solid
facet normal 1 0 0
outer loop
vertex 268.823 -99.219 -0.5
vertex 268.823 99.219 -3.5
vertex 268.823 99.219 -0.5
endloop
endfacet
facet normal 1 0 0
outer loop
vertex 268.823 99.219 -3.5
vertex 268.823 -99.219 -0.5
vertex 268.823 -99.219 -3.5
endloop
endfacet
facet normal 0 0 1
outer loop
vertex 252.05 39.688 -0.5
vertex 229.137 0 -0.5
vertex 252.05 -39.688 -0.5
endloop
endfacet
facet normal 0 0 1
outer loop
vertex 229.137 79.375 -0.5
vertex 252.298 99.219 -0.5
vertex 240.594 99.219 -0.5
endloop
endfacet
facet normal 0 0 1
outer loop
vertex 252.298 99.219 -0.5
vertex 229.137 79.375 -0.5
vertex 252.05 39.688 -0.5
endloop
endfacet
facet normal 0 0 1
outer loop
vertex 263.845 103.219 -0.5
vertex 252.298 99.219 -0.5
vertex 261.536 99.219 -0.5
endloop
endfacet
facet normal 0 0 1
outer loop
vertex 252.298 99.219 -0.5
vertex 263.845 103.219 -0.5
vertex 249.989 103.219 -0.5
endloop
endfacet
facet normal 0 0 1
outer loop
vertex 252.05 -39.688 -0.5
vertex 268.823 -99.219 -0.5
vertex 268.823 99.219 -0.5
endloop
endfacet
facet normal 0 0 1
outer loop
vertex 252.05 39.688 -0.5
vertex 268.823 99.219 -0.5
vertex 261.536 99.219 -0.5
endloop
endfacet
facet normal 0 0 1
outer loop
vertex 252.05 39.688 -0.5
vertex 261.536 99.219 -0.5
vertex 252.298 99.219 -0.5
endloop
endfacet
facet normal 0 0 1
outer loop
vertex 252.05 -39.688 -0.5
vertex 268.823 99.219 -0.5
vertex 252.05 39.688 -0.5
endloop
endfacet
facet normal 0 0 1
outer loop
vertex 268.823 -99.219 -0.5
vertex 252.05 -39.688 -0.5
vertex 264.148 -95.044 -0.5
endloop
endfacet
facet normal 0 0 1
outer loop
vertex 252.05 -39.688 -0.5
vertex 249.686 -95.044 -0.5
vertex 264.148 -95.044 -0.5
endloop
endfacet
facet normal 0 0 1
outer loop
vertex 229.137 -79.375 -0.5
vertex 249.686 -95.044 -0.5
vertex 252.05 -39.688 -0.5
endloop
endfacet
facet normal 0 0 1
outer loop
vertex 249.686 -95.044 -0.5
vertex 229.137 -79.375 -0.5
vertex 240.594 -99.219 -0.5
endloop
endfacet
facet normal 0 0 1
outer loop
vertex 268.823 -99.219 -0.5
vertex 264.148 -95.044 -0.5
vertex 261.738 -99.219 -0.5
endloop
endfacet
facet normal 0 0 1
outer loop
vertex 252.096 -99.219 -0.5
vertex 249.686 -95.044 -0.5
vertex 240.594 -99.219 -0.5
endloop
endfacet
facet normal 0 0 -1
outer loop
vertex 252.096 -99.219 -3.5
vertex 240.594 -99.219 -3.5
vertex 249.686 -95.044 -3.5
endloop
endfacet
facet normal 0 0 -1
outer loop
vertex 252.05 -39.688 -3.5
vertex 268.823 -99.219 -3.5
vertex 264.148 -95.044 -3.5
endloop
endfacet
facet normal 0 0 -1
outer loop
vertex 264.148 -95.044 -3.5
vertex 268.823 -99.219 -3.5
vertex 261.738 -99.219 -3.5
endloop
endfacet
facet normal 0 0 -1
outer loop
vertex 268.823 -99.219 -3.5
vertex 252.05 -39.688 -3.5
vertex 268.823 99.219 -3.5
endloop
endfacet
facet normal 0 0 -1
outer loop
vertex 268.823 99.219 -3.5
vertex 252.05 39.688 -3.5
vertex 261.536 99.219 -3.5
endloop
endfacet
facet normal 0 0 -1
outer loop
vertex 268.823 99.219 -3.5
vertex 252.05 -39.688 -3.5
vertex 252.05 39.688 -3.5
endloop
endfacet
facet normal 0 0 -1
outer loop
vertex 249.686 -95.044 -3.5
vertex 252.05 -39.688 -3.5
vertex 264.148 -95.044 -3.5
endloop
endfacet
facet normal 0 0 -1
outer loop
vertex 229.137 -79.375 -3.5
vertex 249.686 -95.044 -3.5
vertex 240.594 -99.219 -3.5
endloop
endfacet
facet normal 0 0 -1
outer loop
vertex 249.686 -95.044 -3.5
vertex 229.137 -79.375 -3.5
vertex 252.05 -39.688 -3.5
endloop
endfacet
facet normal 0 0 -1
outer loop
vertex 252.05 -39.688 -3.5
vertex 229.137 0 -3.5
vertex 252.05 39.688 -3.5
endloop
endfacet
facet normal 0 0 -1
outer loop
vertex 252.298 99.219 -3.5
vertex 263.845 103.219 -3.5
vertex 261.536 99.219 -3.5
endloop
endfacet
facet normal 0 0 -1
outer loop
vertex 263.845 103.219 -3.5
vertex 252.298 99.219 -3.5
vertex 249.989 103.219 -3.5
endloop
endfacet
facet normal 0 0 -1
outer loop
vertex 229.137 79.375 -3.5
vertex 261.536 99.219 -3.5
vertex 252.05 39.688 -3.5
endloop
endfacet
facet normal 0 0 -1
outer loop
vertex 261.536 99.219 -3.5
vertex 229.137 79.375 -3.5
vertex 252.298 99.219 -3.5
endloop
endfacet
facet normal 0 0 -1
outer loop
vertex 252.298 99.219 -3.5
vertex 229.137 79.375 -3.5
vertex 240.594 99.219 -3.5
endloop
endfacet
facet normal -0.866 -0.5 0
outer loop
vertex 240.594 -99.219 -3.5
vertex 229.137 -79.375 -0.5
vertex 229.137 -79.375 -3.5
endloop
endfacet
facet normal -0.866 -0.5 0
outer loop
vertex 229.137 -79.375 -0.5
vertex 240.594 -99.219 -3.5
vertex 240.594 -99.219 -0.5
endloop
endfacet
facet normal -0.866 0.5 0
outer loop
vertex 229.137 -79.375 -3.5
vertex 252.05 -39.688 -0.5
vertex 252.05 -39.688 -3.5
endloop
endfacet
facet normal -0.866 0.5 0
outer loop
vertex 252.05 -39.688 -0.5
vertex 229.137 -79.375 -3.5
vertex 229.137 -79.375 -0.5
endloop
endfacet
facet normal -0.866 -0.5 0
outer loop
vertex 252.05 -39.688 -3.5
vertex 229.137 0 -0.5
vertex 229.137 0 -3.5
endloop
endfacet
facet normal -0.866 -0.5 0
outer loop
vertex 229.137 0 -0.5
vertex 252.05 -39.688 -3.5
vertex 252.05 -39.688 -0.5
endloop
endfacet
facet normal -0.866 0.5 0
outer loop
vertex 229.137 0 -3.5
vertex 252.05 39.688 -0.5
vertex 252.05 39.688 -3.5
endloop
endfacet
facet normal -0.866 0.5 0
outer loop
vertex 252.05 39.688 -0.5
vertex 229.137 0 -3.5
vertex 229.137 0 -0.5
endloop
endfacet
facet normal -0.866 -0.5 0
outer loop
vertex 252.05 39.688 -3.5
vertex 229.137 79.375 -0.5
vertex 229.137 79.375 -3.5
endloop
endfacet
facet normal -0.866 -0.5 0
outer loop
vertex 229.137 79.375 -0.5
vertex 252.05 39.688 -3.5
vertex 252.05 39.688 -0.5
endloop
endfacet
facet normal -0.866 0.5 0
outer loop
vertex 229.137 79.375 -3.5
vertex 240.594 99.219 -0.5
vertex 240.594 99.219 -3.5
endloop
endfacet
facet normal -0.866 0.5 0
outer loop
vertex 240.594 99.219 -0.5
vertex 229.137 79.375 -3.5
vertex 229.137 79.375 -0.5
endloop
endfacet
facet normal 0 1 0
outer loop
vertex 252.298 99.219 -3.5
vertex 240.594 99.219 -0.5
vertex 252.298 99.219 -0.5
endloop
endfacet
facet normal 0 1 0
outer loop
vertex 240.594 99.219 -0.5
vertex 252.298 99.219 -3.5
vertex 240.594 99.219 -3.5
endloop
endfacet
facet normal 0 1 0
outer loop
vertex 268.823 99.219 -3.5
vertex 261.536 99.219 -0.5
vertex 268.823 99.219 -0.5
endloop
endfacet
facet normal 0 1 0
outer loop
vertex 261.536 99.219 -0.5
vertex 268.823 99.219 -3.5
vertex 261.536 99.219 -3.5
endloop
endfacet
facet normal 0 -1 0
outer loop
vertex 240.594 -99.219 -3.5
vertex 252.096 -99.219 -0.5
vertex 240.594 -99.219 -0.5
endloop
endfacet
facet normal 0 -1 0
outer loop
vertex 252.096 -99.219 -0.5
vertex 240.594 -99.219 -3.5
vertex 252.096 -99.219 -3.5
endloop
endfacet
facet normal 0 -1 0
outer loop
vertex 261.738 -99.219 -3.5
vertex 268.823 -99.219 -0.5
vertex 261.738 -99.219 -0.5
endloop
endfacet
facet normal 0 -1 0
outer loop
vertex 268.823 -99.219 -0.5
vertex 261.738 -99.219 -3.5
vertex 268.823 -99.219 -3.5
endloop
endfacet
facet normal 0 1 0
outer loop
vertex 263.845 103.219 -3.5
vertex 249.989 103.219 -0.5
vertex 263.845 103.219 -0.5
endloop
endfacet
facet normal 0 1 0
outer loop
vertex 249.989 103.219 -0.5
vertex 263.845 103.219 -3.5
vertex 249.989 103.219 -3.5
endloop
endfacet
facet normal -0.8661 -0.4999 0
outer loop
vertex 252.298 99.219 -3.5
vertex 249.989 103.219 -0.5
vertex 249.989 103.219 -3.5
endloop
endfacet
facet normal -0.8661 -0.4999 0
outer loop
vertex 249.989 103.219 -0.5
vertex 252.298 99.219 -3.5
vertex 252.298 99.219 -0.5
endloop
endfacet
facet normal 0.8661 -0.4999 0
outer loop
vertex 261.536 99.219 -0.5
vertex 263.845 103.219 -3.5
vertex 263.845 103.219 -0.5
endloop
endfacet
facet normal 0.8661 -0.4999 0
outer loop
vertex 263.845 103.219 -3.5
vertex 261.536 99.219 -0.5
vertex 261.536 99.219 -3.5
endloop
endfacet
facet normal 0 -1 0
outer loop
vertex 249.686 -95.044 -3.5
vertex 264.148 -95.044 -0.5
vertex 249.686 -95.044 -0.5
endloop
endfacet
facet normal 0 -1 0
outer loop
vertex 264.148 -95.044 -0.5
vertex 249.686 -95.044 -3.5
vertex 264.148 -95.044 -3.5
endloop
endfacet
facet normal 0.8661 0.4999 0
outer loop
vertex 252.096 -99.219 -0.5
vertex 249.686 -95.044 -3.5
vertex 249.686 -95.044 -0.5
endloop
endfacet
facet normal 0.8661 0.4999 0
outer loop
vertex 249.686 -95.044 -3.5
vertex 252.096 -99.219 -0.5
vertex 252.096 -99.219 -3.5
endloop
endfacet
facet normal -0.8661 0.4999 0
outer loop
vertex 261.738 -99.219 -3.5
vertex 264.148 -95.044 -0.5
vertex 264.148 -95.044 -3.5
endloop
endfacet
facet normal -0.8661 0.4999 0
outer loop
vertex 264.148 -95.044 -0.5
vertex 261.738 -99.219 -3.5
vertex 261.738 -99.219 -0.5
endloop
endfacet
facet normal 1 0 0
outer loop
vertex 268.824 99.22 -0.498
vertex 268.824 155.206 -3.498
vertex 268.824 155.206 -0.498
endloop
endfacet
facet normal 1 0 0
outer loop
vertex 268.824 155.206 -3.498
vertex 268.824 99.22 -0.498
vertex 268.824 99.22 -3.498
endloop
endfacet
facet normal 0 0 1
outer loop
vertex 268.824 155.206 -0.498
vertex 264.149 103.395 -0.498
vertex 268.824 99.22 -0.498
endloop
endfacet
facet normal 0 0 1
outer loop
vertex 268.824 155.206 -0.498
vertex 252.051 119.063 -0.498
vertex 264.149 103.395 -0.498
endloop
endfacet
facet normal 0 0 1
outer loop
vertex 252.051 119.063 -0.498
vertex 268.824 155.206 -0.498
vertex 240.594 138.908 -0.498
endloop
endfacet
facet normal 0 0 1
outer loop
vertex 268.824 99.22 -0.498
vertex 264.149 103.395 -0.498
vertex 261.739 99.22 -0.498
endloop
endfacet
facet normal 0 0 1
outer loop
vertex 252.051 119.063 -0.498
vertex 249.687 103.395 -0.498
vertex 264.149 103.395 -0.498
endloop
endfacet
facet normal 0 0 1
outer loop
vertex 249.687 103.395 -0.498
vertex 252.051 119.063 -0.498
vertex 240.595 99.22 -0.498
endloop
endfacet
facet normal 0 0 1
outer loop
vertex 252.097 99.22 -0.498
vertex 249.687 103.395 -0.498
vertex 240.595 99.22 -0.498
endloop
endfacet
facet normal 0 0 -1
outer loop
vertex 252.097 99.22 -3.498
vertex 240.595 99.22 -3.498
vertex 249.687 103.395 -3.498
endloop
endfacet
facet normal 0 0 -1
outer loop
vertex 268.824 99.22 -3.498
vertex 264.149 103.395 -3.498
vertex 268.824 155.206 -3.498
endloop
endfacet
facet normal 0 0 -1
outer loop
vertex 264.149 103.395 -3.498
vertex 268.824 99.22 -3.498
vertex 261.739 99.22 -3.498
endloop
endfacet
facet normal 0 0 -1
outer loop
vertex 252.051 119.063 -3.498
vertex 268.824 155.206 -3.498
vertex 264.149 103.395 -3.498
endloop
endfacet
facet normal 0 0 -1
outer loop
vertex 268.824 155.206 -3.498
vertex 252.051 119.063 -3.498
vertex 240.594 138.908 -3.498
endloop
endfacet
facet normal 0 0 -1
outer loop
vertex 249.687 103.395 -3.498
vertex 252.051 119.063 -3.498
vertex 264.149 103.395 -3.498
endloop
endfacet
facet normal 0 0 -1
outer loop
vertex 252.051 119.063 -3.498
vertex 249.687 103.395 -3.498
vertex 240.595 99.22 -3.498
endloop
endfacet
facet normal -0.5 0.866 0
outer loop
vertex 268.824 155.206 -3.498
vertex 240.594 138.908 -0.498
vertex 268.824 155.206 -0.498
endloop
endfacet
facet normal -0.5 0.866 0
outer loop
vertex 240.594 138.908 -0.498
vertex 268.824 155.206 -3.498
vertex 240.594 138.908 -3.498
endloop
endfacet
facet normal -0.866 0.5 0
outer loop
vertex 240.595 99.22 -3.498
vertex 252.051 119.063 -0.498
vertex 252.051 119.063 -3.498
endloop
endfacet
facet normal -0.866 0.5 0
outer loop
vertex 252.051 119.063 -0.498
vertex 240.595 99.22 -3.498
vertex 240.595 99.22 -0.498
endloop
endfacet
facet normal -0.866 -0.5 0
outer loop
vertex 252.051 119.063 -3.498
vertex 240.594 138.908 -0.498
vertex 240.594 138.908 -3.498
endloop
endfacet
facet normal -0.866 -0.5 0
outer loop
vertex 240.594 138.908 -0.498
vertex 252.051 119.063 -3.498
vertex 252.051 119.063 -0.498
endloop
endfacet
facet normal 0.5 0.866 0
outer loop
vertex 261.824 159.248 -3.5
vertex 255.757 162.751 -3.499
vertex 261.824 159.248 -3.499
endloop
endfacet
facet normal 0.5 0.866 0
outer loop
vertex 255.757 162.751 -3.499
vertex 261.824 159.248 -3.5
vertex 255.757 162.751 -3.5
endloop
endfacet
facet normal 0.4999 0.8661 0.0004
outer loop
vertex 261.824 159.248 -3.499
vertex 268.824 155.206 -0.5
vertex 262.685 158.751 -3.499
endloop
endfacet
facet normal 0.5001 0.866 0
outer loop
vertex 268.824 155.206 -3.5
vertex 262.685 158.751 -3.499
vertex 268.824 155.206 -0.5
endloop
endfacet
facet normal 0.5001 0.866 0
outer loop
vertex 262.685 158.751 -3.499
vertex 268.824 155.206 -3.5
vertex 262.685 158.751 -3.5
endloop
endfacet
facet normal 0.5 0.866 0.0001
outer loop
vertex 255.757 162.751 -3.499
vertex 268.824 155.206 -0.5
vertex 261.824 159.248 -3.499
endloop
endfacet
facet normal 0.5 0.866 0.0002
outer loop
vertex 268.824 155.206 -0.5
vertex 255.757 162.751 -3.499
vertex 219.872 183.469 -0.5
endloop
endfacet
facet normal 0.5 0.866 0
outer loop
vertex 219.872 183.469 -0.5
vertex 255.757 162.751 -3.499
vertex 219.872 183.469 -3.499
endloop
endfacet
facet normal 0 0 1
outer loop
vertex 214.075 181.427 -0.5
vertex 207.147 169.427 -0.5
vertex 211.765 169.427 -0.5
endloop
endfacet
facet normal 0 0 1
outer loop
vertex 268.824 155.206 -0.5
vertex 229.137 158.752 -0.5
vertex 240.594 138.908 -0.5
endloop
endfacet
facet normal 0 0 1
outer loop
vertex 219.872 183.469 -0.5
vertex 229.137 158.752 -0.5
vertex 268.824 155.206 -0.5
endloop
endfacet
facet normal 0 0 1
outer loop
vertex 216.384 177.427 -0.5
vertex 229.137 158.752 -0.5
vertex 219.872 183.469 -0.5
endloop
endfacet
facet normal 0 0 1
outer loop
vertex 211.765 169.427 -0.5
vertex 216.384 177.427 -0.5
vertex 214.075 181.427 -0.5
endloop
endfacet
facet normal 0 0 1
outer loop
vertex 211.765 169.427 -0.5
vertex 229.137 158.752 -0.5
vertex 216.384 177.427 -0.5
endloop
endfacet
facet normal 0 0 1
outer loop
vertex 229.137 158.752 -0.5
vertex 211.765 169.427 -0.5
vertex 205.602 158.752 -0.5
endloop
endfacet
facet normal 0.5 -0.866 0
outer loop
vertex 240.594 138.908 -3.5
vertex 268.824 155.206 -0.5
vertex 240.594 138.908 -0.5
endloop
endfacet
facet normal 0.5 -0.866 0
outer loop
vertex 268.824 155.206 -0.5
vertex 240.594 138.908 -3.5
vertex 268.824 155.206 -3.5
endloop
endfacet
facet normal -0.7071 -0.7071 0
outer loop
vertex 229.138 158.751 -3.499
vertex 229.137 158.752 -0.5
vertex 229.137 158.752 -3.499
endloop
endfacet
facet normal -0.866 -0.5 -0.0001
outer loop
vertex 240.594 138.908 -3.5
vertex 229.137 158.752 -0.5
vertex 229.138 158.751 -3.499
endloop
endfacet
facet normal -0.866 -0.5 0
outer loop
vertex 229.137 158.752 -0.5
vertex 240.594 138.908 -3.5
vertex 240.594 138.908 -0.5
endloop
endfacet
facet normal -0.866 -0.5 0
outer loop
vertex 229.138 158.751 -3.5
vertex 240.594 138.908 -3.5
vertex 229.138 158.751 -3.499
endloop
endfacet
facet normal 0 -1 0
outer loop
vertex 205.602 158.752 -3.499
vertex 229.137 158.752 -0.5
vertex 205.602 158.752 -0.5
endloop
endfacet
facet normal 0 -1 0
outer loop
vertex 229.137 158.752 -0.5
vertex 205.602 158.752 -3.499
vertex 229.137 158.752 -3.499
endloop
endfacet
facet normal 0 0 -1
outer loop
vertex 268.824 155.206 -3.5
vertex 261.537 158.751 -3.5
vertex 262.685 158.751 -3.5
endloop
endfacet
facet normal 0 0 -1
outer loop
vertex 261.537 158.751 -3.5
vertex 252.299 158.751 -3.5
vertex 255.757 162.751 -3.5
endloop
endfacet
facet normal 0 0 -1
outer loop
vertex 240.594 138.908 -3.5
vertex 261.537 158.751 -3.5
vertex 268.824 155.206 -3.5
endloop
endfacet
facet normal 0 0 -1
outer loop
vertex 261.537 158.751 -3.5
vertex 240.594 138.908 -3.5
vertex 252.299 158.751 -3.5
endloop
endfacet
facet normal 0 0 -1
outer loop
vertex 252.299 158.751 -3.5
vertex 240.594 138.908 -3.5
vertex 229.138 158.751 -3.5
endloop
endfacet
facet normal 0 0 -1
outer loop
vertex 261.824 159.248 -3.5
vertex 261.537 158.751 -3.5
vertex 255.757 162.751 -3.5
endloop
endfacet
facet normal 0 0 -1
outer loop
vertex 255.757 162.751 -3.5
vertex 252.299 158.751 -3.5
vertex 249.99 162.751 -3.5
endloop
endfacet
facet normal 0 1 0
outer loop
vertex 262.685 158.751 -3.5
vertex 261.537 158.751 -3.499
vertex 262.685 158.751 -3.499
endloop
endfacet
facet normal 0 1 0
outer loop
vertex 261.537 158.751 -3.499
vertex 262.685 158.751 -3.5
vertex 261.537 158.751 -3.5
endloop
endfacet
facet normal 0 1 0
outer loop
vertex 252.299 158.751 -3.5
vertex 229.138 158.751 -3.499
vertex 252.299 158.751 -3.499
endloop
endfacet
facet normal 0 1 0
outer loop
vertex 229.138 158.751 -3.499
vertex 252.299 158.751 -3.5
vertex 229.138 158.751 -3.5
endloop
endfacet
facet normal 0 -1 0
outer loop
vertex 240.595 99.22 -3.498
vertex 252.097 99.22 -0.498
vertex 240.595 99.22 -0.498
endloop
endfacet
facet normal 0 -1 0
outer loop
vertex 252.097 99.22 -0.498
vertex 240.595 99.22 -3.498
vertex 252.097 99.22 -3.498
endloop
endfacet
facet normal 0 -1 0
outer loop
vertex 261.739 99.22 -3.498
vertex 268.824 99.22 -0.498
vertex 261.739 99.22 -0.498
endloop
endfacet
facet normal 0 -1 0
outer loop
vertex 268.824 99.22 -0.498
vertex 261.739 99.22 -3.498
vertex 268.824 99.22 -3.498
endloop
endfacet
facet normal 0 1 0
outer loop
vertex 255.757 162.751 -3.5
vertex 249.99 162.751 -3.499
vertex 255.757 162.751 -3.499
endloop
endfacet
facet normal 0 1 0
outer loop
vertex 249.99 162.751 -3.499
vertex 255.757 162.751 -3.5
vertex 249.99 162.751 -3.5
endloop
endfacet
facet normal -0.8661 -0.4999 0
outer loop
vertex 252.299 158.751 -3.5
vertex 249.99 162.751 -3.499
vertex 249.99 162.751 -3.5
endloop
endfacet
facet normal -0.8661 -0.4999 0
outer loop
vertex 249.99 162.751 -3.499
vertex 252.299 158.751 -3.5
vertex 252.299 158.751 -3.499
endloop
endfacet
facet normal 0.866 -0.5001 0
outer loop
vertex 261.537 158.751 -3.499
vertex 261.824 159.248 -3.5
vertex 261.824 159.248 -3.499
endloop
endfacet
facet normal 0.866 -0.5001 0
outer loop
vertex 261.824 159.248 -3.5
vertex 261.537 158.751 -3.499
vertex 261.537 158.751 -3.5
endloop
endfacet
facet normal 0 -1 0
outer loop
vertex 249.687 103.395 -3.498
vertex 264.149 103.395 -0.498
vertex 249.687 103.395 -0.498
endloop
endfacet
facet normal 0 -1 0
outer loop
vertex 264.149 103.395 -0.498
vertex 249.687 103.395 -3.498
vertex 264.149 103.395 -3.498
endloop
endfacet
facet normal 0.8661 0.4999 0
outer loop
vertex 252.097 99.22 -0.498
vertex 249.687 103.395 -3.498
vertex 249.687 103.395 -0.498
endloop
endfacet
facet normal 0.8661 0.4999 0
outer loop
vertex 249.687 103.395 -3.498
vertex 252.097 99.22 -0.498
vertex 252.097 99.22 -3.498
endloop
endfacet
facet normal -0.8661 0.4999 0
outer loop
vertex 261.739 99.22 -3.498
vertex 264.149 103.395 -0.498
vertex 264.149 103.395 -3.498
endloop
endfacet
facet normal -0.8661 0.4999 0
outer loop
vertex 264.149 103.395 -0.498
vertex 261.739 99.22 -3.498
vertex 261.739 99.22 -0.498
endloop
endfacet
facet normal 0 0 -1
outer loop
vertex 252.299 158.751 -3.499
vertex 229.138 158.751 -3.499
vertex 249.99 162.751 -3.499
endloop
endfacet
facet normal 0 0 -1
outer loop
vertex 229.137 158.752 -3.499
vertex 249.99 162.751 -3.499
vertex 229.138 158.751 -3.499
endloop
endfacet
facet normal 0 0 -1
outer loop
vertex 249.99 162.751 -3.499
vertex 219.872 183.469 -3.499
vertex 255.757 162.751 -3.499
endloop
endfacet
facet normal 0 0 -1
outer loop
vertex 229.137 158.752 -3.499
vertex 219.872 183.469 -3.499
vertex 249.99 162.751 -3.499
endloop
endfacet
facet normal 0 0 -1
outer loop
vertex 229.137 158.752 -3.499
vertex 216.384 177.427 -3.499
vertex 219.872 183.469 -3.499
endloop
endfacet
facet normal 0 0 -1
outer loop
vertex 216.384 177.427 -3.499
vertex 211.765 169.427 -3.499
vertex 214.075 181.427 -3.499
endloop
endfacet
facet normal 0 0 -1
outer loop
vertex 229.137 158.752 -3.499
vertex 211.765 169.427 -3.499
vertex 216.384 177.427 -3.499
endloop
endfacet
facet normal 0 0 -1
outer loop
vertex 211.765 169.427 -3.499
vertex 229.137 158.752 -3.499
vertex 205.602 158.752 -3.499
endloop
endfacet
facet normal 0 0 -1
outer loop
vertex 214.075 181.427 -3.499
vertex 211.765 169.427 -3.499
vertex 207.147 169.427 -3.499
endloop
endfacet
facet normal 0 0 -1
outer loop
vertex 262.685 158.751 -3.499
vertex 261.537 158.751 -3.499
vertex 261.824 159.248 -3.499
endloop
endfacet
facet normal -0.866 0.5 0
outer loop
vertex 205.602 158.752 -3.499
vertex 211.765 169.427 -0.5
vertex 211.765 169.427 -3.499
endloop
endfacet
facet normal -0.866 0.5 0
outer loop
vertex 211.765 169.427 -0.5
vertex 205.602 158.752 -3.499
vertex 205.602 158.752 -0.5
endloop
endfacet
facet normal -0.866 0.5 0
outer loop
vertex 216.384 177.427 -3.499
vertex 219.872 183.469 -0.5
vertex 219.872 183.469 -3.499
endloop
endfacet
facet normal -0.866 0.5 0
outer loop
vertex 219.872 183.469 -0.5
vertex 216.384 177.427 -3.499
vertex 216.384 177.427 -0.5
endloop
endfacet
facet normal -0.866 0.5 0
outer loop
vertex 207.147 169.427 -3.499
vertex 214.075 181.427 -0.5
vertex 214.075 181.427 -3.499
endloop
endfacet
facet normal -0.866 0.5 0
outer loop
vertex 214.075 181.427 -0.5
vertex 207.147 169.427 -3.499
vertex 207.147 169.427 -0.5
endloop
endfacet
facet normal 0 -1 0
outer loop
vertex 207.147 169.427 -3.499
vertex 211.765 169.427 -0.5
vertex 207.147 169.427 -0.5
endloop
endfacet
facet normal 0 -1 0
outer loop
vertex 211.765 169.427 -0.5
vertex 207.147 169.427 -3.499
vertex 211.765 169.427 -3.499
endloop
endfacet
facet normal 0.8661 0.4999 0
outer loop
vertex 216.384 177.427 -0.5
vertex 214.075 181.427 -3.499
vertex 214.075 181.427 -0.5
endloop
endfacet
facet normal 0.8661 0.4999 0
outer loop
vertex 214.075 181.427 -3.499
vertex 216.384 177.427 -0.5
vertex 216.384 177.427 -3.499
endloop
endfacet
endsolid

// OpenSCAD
use <mylib.scad>;
p = .001;
pp = 2 * p;
t0 = 1;
f = .35;
sqrt3 = sqrt(3);    // 1.732
sqrt3_2 = sqrt3/2;  // .866

h2 = 3.125*25.4; // 2H; H = 15.625

// 3.125 = 2H; R, H=sqrt3*R/2; R = H*2/sqrt3

// hex frame for settlers
r = h2/2 *2 * sqrt3;
module hexagon(tr=[0,0,0], r = h2/sqrt3, t = t0, center = true) {
  translate(tr) cylinder(h = t, r=r, $fn=6, center = center);
}

// rtr: [tr, rotr]
// - rotr: [ax, ay, az, [cx, cy, cz]]
// r: (10) radius = edge
// t: (1) thickness
// center: (false) for z-axiz
module triangle(rtr=[0,0,0, [0,0,0, [0,0,0]]], r=10, t=1, center = false) {
  rtr = def(rtr, [0,0,0]);
  r = def(r, 10);
  trr(rtr)
  cylinder(h = t, r = r, center = center, $fn=3);
}
// 3.125" across width
module fullMap(h2 = h2) {
  rmm = [[-3,3], [-3,2], [-2,2], [-2, 1]];
  translate([0,0,-2]) {
  for (col = [-3:1:3]) let(ac = abs(col), ce = (col % 2 == 0), rm=rmm[ac])
    for (row = [rm[0] : 1 : rm[1]]) 
      let(x = col*r/2, y = (ce) ? row*h2 : (row+.5)*h2)
      echo("col, row=", col, row, "ce=", ce, "x, y=", x, y)
      color(row == 0 && col == 0 ? "blue" : (row+col)%2 == 0? "green":"yellow")
        hexagon([x, y, 0], h2/sqrt3+p, t= 5 );
  }
}

// col: place at 'col' of main board metaHex (0)
// h2: ortho size of hex, x_width (h2)
// dz: thickness
// center: 
module oneCol(col = 0, h2 = h2, dz = 5, center = true) {
  r = h2 * sqrt3; // radius of hex with ortho x_width = h2 (~79 -> ~46)
  rmm = [[-3,3], [-3,2], [-2,2], [-2, 1], [-1, 0]];
  let(ac = abs(col), ce = (col % 2 == 0), rm=rmm[ac])
  for (row = [rm[0] : 1 : rm[1]]) 
    let(x = col*r/2, y = (ce) ? row*h2 : (row+.5)*h2)
      color(row == 0 && col == 0 ? "blue" : (row+col)%2 == 0? "green":"yellow")
        hexagon([x, y, 0], h2/sqrt3+p, t = dz, center = center );
}

// TODO: add hook to one end, subtract it from other

// h2: orther size of hex; x_width (h2)
// wf: x_width of frame piece (h2*33/80)
// oz: offset_z
module frame(h2 = h2, wf, oz = -2) {
  wf = def(wf, h2*.5); // width of frame
  dz = 3+pp;       // thickness of frame
  col = 3;         // placement of frame
  H = h2/2; R = h2/sqrt3;
  k =  R * (3 * col + 1) / 2; // R/2 + col * 1.5 * R;
  wt = (k + wf)/1.5;  // 'radius' of intersecting triangle
  fh = 4 * h2;     // total frame height
  hr = 8;          // radius of hook triangle
  hs = 2.5 * h2;   // height of straight part
  csp = k+wf/2;    // center of straight part (x-coord)
  module fullFrame() {
    // cut the adjacent hexes:
    difference() 
    {
      // make edge piece as trapezoid:
      intersection() 
      {
        // echo("frame: col, H, R, k, wt=", [col, H, R, k, wt]);
        translate([k, -fh/2, oz-dz/2+p])
          cube([wf, fh, dz-pp], false);
        // color("cyan") 
        triangle([wt, 0, oz, [0, 0, 180]], wt, t=dz, center = true);
      }
      // the adjacent hexes:
      translate([0, 0, oz]) oneCol(col, h2, dz+pp);
    }
  }

  // hs: height of straight cut
  // children(0) straight frame
  // children(1) tilted frame
  module cutit(hs = hs) {
    es = (fh-hs)/2;  // end size
    ec = -wf*.66;    // intersects ray from center @ 30', 

    // Place a hook (triangle) at rtr.
    // hr: radius of hook triangle
    // rtr: [dx, dy, dz {, rotr}] ([0, 0, 0])
    //  - rotr: [rx, ry, rz {, cxyz}] ([0, 0, 0])
    //  - cxyz: [cx, cy, cz] ([0, 0, 0])
    module hook(rtr, hr = hr) {
      trr(rtr) triangle([0, 0, 0], hr, dz+pp, true);
    }
    // Given: child(0) is centered, child(1) is positioned at top.
    // - sf[3] --> center; rtr --> bottom
    // 
    // add child(1) then subtract rtr(sf(child(1), -rtr/2))
    // child(0)+child(1)-tr(rtr, child(1)*sf)
    // for ex: addAndCut([0, -hs, 0], [-wf*.2, -hs/2, 0]) straightPart() trr([wf*.2, hs/2, 0]) hook();
    // sf: [sx, sy, sz {, cxyz }] ([0, 0, 0])
    // - cxyz: [cx, cy, cz] ([1, 1, 1])
    module addAndCut(rtr, sf) {
      rtr = def(rtr, [0, 0, 0]);
      sf = def(sf, [1, 1, 1]);
      difference() 
      {
        union() {
          children(0);
          children(1);
        }
        // move to cut location
        trr(rtr) scalet(sf)  children(1);
      }
    }
    // extract straight part of child(0) = fullFrame
    module straightPart(tr) {
      trh = [wf*.2, hs/2, 0, [0, 0, 30]];
      mtrh = amul(as3D(trh), [-1, -1, -1]);
      intersection()  // straight section
      {
        children(0);
        translate(tr) 
        addAndCut([0, -hs, 0], [(hr+f)/hr, (hr+f)/hr, 1, mtrh]) {
          cube([wf, hs, dz+pp], true);
          hook(trh);
        }
      }
    }

    // child(0) fullFrame
    module cornerPart(trf) {
      trt = [0, 0, p, [0, 0, 60, [ec, 0, 0]]];
      trf = def(trf, [csp, (es+hs)/2, oz]);
      trh = [wf*.2, es/2, 0, [0, 0, 30]]; // place hook at top of cube
      mtrh = amul(as3D(trh), [-1, -1, -1]); // unhook

      translate([p, p, pp]) // cosmetic
      color("red")
      intersection()
      {
        children(0);   // fullFrame
        translate(trf) {
          dup(trt)
          addAndCut([0, -es, 0], [(hr+f)/hr, (hr+f)/hr, 1, mtrh]) {
            cube([wf, es, dz+pp], true);   // cube @ (0,0)
            hook(trh);        // hook at top
          }
        }
      }
    }

    straightPart([csp, 0, oz]) children(0); // translate to location of frame
    cornerPart([csp, (es+hs)/2, oz]) children(0);
    
  }

  cutit()
  dup([-0*f, 0*f, -pp], [0, 0, 60])
  fullFrame();

}

// translate(v = [-250, 0, -4]) 
// dup([0,0,0], [0, 0, -60])
// dup([0,0,0], [0, 0, -60])
// dup([0,0,0], [0, 0, -60])
// dup([0,0,0], [0, 0, -60])
frame(h2);


// TODO: partition as straight piece & corner piece:
